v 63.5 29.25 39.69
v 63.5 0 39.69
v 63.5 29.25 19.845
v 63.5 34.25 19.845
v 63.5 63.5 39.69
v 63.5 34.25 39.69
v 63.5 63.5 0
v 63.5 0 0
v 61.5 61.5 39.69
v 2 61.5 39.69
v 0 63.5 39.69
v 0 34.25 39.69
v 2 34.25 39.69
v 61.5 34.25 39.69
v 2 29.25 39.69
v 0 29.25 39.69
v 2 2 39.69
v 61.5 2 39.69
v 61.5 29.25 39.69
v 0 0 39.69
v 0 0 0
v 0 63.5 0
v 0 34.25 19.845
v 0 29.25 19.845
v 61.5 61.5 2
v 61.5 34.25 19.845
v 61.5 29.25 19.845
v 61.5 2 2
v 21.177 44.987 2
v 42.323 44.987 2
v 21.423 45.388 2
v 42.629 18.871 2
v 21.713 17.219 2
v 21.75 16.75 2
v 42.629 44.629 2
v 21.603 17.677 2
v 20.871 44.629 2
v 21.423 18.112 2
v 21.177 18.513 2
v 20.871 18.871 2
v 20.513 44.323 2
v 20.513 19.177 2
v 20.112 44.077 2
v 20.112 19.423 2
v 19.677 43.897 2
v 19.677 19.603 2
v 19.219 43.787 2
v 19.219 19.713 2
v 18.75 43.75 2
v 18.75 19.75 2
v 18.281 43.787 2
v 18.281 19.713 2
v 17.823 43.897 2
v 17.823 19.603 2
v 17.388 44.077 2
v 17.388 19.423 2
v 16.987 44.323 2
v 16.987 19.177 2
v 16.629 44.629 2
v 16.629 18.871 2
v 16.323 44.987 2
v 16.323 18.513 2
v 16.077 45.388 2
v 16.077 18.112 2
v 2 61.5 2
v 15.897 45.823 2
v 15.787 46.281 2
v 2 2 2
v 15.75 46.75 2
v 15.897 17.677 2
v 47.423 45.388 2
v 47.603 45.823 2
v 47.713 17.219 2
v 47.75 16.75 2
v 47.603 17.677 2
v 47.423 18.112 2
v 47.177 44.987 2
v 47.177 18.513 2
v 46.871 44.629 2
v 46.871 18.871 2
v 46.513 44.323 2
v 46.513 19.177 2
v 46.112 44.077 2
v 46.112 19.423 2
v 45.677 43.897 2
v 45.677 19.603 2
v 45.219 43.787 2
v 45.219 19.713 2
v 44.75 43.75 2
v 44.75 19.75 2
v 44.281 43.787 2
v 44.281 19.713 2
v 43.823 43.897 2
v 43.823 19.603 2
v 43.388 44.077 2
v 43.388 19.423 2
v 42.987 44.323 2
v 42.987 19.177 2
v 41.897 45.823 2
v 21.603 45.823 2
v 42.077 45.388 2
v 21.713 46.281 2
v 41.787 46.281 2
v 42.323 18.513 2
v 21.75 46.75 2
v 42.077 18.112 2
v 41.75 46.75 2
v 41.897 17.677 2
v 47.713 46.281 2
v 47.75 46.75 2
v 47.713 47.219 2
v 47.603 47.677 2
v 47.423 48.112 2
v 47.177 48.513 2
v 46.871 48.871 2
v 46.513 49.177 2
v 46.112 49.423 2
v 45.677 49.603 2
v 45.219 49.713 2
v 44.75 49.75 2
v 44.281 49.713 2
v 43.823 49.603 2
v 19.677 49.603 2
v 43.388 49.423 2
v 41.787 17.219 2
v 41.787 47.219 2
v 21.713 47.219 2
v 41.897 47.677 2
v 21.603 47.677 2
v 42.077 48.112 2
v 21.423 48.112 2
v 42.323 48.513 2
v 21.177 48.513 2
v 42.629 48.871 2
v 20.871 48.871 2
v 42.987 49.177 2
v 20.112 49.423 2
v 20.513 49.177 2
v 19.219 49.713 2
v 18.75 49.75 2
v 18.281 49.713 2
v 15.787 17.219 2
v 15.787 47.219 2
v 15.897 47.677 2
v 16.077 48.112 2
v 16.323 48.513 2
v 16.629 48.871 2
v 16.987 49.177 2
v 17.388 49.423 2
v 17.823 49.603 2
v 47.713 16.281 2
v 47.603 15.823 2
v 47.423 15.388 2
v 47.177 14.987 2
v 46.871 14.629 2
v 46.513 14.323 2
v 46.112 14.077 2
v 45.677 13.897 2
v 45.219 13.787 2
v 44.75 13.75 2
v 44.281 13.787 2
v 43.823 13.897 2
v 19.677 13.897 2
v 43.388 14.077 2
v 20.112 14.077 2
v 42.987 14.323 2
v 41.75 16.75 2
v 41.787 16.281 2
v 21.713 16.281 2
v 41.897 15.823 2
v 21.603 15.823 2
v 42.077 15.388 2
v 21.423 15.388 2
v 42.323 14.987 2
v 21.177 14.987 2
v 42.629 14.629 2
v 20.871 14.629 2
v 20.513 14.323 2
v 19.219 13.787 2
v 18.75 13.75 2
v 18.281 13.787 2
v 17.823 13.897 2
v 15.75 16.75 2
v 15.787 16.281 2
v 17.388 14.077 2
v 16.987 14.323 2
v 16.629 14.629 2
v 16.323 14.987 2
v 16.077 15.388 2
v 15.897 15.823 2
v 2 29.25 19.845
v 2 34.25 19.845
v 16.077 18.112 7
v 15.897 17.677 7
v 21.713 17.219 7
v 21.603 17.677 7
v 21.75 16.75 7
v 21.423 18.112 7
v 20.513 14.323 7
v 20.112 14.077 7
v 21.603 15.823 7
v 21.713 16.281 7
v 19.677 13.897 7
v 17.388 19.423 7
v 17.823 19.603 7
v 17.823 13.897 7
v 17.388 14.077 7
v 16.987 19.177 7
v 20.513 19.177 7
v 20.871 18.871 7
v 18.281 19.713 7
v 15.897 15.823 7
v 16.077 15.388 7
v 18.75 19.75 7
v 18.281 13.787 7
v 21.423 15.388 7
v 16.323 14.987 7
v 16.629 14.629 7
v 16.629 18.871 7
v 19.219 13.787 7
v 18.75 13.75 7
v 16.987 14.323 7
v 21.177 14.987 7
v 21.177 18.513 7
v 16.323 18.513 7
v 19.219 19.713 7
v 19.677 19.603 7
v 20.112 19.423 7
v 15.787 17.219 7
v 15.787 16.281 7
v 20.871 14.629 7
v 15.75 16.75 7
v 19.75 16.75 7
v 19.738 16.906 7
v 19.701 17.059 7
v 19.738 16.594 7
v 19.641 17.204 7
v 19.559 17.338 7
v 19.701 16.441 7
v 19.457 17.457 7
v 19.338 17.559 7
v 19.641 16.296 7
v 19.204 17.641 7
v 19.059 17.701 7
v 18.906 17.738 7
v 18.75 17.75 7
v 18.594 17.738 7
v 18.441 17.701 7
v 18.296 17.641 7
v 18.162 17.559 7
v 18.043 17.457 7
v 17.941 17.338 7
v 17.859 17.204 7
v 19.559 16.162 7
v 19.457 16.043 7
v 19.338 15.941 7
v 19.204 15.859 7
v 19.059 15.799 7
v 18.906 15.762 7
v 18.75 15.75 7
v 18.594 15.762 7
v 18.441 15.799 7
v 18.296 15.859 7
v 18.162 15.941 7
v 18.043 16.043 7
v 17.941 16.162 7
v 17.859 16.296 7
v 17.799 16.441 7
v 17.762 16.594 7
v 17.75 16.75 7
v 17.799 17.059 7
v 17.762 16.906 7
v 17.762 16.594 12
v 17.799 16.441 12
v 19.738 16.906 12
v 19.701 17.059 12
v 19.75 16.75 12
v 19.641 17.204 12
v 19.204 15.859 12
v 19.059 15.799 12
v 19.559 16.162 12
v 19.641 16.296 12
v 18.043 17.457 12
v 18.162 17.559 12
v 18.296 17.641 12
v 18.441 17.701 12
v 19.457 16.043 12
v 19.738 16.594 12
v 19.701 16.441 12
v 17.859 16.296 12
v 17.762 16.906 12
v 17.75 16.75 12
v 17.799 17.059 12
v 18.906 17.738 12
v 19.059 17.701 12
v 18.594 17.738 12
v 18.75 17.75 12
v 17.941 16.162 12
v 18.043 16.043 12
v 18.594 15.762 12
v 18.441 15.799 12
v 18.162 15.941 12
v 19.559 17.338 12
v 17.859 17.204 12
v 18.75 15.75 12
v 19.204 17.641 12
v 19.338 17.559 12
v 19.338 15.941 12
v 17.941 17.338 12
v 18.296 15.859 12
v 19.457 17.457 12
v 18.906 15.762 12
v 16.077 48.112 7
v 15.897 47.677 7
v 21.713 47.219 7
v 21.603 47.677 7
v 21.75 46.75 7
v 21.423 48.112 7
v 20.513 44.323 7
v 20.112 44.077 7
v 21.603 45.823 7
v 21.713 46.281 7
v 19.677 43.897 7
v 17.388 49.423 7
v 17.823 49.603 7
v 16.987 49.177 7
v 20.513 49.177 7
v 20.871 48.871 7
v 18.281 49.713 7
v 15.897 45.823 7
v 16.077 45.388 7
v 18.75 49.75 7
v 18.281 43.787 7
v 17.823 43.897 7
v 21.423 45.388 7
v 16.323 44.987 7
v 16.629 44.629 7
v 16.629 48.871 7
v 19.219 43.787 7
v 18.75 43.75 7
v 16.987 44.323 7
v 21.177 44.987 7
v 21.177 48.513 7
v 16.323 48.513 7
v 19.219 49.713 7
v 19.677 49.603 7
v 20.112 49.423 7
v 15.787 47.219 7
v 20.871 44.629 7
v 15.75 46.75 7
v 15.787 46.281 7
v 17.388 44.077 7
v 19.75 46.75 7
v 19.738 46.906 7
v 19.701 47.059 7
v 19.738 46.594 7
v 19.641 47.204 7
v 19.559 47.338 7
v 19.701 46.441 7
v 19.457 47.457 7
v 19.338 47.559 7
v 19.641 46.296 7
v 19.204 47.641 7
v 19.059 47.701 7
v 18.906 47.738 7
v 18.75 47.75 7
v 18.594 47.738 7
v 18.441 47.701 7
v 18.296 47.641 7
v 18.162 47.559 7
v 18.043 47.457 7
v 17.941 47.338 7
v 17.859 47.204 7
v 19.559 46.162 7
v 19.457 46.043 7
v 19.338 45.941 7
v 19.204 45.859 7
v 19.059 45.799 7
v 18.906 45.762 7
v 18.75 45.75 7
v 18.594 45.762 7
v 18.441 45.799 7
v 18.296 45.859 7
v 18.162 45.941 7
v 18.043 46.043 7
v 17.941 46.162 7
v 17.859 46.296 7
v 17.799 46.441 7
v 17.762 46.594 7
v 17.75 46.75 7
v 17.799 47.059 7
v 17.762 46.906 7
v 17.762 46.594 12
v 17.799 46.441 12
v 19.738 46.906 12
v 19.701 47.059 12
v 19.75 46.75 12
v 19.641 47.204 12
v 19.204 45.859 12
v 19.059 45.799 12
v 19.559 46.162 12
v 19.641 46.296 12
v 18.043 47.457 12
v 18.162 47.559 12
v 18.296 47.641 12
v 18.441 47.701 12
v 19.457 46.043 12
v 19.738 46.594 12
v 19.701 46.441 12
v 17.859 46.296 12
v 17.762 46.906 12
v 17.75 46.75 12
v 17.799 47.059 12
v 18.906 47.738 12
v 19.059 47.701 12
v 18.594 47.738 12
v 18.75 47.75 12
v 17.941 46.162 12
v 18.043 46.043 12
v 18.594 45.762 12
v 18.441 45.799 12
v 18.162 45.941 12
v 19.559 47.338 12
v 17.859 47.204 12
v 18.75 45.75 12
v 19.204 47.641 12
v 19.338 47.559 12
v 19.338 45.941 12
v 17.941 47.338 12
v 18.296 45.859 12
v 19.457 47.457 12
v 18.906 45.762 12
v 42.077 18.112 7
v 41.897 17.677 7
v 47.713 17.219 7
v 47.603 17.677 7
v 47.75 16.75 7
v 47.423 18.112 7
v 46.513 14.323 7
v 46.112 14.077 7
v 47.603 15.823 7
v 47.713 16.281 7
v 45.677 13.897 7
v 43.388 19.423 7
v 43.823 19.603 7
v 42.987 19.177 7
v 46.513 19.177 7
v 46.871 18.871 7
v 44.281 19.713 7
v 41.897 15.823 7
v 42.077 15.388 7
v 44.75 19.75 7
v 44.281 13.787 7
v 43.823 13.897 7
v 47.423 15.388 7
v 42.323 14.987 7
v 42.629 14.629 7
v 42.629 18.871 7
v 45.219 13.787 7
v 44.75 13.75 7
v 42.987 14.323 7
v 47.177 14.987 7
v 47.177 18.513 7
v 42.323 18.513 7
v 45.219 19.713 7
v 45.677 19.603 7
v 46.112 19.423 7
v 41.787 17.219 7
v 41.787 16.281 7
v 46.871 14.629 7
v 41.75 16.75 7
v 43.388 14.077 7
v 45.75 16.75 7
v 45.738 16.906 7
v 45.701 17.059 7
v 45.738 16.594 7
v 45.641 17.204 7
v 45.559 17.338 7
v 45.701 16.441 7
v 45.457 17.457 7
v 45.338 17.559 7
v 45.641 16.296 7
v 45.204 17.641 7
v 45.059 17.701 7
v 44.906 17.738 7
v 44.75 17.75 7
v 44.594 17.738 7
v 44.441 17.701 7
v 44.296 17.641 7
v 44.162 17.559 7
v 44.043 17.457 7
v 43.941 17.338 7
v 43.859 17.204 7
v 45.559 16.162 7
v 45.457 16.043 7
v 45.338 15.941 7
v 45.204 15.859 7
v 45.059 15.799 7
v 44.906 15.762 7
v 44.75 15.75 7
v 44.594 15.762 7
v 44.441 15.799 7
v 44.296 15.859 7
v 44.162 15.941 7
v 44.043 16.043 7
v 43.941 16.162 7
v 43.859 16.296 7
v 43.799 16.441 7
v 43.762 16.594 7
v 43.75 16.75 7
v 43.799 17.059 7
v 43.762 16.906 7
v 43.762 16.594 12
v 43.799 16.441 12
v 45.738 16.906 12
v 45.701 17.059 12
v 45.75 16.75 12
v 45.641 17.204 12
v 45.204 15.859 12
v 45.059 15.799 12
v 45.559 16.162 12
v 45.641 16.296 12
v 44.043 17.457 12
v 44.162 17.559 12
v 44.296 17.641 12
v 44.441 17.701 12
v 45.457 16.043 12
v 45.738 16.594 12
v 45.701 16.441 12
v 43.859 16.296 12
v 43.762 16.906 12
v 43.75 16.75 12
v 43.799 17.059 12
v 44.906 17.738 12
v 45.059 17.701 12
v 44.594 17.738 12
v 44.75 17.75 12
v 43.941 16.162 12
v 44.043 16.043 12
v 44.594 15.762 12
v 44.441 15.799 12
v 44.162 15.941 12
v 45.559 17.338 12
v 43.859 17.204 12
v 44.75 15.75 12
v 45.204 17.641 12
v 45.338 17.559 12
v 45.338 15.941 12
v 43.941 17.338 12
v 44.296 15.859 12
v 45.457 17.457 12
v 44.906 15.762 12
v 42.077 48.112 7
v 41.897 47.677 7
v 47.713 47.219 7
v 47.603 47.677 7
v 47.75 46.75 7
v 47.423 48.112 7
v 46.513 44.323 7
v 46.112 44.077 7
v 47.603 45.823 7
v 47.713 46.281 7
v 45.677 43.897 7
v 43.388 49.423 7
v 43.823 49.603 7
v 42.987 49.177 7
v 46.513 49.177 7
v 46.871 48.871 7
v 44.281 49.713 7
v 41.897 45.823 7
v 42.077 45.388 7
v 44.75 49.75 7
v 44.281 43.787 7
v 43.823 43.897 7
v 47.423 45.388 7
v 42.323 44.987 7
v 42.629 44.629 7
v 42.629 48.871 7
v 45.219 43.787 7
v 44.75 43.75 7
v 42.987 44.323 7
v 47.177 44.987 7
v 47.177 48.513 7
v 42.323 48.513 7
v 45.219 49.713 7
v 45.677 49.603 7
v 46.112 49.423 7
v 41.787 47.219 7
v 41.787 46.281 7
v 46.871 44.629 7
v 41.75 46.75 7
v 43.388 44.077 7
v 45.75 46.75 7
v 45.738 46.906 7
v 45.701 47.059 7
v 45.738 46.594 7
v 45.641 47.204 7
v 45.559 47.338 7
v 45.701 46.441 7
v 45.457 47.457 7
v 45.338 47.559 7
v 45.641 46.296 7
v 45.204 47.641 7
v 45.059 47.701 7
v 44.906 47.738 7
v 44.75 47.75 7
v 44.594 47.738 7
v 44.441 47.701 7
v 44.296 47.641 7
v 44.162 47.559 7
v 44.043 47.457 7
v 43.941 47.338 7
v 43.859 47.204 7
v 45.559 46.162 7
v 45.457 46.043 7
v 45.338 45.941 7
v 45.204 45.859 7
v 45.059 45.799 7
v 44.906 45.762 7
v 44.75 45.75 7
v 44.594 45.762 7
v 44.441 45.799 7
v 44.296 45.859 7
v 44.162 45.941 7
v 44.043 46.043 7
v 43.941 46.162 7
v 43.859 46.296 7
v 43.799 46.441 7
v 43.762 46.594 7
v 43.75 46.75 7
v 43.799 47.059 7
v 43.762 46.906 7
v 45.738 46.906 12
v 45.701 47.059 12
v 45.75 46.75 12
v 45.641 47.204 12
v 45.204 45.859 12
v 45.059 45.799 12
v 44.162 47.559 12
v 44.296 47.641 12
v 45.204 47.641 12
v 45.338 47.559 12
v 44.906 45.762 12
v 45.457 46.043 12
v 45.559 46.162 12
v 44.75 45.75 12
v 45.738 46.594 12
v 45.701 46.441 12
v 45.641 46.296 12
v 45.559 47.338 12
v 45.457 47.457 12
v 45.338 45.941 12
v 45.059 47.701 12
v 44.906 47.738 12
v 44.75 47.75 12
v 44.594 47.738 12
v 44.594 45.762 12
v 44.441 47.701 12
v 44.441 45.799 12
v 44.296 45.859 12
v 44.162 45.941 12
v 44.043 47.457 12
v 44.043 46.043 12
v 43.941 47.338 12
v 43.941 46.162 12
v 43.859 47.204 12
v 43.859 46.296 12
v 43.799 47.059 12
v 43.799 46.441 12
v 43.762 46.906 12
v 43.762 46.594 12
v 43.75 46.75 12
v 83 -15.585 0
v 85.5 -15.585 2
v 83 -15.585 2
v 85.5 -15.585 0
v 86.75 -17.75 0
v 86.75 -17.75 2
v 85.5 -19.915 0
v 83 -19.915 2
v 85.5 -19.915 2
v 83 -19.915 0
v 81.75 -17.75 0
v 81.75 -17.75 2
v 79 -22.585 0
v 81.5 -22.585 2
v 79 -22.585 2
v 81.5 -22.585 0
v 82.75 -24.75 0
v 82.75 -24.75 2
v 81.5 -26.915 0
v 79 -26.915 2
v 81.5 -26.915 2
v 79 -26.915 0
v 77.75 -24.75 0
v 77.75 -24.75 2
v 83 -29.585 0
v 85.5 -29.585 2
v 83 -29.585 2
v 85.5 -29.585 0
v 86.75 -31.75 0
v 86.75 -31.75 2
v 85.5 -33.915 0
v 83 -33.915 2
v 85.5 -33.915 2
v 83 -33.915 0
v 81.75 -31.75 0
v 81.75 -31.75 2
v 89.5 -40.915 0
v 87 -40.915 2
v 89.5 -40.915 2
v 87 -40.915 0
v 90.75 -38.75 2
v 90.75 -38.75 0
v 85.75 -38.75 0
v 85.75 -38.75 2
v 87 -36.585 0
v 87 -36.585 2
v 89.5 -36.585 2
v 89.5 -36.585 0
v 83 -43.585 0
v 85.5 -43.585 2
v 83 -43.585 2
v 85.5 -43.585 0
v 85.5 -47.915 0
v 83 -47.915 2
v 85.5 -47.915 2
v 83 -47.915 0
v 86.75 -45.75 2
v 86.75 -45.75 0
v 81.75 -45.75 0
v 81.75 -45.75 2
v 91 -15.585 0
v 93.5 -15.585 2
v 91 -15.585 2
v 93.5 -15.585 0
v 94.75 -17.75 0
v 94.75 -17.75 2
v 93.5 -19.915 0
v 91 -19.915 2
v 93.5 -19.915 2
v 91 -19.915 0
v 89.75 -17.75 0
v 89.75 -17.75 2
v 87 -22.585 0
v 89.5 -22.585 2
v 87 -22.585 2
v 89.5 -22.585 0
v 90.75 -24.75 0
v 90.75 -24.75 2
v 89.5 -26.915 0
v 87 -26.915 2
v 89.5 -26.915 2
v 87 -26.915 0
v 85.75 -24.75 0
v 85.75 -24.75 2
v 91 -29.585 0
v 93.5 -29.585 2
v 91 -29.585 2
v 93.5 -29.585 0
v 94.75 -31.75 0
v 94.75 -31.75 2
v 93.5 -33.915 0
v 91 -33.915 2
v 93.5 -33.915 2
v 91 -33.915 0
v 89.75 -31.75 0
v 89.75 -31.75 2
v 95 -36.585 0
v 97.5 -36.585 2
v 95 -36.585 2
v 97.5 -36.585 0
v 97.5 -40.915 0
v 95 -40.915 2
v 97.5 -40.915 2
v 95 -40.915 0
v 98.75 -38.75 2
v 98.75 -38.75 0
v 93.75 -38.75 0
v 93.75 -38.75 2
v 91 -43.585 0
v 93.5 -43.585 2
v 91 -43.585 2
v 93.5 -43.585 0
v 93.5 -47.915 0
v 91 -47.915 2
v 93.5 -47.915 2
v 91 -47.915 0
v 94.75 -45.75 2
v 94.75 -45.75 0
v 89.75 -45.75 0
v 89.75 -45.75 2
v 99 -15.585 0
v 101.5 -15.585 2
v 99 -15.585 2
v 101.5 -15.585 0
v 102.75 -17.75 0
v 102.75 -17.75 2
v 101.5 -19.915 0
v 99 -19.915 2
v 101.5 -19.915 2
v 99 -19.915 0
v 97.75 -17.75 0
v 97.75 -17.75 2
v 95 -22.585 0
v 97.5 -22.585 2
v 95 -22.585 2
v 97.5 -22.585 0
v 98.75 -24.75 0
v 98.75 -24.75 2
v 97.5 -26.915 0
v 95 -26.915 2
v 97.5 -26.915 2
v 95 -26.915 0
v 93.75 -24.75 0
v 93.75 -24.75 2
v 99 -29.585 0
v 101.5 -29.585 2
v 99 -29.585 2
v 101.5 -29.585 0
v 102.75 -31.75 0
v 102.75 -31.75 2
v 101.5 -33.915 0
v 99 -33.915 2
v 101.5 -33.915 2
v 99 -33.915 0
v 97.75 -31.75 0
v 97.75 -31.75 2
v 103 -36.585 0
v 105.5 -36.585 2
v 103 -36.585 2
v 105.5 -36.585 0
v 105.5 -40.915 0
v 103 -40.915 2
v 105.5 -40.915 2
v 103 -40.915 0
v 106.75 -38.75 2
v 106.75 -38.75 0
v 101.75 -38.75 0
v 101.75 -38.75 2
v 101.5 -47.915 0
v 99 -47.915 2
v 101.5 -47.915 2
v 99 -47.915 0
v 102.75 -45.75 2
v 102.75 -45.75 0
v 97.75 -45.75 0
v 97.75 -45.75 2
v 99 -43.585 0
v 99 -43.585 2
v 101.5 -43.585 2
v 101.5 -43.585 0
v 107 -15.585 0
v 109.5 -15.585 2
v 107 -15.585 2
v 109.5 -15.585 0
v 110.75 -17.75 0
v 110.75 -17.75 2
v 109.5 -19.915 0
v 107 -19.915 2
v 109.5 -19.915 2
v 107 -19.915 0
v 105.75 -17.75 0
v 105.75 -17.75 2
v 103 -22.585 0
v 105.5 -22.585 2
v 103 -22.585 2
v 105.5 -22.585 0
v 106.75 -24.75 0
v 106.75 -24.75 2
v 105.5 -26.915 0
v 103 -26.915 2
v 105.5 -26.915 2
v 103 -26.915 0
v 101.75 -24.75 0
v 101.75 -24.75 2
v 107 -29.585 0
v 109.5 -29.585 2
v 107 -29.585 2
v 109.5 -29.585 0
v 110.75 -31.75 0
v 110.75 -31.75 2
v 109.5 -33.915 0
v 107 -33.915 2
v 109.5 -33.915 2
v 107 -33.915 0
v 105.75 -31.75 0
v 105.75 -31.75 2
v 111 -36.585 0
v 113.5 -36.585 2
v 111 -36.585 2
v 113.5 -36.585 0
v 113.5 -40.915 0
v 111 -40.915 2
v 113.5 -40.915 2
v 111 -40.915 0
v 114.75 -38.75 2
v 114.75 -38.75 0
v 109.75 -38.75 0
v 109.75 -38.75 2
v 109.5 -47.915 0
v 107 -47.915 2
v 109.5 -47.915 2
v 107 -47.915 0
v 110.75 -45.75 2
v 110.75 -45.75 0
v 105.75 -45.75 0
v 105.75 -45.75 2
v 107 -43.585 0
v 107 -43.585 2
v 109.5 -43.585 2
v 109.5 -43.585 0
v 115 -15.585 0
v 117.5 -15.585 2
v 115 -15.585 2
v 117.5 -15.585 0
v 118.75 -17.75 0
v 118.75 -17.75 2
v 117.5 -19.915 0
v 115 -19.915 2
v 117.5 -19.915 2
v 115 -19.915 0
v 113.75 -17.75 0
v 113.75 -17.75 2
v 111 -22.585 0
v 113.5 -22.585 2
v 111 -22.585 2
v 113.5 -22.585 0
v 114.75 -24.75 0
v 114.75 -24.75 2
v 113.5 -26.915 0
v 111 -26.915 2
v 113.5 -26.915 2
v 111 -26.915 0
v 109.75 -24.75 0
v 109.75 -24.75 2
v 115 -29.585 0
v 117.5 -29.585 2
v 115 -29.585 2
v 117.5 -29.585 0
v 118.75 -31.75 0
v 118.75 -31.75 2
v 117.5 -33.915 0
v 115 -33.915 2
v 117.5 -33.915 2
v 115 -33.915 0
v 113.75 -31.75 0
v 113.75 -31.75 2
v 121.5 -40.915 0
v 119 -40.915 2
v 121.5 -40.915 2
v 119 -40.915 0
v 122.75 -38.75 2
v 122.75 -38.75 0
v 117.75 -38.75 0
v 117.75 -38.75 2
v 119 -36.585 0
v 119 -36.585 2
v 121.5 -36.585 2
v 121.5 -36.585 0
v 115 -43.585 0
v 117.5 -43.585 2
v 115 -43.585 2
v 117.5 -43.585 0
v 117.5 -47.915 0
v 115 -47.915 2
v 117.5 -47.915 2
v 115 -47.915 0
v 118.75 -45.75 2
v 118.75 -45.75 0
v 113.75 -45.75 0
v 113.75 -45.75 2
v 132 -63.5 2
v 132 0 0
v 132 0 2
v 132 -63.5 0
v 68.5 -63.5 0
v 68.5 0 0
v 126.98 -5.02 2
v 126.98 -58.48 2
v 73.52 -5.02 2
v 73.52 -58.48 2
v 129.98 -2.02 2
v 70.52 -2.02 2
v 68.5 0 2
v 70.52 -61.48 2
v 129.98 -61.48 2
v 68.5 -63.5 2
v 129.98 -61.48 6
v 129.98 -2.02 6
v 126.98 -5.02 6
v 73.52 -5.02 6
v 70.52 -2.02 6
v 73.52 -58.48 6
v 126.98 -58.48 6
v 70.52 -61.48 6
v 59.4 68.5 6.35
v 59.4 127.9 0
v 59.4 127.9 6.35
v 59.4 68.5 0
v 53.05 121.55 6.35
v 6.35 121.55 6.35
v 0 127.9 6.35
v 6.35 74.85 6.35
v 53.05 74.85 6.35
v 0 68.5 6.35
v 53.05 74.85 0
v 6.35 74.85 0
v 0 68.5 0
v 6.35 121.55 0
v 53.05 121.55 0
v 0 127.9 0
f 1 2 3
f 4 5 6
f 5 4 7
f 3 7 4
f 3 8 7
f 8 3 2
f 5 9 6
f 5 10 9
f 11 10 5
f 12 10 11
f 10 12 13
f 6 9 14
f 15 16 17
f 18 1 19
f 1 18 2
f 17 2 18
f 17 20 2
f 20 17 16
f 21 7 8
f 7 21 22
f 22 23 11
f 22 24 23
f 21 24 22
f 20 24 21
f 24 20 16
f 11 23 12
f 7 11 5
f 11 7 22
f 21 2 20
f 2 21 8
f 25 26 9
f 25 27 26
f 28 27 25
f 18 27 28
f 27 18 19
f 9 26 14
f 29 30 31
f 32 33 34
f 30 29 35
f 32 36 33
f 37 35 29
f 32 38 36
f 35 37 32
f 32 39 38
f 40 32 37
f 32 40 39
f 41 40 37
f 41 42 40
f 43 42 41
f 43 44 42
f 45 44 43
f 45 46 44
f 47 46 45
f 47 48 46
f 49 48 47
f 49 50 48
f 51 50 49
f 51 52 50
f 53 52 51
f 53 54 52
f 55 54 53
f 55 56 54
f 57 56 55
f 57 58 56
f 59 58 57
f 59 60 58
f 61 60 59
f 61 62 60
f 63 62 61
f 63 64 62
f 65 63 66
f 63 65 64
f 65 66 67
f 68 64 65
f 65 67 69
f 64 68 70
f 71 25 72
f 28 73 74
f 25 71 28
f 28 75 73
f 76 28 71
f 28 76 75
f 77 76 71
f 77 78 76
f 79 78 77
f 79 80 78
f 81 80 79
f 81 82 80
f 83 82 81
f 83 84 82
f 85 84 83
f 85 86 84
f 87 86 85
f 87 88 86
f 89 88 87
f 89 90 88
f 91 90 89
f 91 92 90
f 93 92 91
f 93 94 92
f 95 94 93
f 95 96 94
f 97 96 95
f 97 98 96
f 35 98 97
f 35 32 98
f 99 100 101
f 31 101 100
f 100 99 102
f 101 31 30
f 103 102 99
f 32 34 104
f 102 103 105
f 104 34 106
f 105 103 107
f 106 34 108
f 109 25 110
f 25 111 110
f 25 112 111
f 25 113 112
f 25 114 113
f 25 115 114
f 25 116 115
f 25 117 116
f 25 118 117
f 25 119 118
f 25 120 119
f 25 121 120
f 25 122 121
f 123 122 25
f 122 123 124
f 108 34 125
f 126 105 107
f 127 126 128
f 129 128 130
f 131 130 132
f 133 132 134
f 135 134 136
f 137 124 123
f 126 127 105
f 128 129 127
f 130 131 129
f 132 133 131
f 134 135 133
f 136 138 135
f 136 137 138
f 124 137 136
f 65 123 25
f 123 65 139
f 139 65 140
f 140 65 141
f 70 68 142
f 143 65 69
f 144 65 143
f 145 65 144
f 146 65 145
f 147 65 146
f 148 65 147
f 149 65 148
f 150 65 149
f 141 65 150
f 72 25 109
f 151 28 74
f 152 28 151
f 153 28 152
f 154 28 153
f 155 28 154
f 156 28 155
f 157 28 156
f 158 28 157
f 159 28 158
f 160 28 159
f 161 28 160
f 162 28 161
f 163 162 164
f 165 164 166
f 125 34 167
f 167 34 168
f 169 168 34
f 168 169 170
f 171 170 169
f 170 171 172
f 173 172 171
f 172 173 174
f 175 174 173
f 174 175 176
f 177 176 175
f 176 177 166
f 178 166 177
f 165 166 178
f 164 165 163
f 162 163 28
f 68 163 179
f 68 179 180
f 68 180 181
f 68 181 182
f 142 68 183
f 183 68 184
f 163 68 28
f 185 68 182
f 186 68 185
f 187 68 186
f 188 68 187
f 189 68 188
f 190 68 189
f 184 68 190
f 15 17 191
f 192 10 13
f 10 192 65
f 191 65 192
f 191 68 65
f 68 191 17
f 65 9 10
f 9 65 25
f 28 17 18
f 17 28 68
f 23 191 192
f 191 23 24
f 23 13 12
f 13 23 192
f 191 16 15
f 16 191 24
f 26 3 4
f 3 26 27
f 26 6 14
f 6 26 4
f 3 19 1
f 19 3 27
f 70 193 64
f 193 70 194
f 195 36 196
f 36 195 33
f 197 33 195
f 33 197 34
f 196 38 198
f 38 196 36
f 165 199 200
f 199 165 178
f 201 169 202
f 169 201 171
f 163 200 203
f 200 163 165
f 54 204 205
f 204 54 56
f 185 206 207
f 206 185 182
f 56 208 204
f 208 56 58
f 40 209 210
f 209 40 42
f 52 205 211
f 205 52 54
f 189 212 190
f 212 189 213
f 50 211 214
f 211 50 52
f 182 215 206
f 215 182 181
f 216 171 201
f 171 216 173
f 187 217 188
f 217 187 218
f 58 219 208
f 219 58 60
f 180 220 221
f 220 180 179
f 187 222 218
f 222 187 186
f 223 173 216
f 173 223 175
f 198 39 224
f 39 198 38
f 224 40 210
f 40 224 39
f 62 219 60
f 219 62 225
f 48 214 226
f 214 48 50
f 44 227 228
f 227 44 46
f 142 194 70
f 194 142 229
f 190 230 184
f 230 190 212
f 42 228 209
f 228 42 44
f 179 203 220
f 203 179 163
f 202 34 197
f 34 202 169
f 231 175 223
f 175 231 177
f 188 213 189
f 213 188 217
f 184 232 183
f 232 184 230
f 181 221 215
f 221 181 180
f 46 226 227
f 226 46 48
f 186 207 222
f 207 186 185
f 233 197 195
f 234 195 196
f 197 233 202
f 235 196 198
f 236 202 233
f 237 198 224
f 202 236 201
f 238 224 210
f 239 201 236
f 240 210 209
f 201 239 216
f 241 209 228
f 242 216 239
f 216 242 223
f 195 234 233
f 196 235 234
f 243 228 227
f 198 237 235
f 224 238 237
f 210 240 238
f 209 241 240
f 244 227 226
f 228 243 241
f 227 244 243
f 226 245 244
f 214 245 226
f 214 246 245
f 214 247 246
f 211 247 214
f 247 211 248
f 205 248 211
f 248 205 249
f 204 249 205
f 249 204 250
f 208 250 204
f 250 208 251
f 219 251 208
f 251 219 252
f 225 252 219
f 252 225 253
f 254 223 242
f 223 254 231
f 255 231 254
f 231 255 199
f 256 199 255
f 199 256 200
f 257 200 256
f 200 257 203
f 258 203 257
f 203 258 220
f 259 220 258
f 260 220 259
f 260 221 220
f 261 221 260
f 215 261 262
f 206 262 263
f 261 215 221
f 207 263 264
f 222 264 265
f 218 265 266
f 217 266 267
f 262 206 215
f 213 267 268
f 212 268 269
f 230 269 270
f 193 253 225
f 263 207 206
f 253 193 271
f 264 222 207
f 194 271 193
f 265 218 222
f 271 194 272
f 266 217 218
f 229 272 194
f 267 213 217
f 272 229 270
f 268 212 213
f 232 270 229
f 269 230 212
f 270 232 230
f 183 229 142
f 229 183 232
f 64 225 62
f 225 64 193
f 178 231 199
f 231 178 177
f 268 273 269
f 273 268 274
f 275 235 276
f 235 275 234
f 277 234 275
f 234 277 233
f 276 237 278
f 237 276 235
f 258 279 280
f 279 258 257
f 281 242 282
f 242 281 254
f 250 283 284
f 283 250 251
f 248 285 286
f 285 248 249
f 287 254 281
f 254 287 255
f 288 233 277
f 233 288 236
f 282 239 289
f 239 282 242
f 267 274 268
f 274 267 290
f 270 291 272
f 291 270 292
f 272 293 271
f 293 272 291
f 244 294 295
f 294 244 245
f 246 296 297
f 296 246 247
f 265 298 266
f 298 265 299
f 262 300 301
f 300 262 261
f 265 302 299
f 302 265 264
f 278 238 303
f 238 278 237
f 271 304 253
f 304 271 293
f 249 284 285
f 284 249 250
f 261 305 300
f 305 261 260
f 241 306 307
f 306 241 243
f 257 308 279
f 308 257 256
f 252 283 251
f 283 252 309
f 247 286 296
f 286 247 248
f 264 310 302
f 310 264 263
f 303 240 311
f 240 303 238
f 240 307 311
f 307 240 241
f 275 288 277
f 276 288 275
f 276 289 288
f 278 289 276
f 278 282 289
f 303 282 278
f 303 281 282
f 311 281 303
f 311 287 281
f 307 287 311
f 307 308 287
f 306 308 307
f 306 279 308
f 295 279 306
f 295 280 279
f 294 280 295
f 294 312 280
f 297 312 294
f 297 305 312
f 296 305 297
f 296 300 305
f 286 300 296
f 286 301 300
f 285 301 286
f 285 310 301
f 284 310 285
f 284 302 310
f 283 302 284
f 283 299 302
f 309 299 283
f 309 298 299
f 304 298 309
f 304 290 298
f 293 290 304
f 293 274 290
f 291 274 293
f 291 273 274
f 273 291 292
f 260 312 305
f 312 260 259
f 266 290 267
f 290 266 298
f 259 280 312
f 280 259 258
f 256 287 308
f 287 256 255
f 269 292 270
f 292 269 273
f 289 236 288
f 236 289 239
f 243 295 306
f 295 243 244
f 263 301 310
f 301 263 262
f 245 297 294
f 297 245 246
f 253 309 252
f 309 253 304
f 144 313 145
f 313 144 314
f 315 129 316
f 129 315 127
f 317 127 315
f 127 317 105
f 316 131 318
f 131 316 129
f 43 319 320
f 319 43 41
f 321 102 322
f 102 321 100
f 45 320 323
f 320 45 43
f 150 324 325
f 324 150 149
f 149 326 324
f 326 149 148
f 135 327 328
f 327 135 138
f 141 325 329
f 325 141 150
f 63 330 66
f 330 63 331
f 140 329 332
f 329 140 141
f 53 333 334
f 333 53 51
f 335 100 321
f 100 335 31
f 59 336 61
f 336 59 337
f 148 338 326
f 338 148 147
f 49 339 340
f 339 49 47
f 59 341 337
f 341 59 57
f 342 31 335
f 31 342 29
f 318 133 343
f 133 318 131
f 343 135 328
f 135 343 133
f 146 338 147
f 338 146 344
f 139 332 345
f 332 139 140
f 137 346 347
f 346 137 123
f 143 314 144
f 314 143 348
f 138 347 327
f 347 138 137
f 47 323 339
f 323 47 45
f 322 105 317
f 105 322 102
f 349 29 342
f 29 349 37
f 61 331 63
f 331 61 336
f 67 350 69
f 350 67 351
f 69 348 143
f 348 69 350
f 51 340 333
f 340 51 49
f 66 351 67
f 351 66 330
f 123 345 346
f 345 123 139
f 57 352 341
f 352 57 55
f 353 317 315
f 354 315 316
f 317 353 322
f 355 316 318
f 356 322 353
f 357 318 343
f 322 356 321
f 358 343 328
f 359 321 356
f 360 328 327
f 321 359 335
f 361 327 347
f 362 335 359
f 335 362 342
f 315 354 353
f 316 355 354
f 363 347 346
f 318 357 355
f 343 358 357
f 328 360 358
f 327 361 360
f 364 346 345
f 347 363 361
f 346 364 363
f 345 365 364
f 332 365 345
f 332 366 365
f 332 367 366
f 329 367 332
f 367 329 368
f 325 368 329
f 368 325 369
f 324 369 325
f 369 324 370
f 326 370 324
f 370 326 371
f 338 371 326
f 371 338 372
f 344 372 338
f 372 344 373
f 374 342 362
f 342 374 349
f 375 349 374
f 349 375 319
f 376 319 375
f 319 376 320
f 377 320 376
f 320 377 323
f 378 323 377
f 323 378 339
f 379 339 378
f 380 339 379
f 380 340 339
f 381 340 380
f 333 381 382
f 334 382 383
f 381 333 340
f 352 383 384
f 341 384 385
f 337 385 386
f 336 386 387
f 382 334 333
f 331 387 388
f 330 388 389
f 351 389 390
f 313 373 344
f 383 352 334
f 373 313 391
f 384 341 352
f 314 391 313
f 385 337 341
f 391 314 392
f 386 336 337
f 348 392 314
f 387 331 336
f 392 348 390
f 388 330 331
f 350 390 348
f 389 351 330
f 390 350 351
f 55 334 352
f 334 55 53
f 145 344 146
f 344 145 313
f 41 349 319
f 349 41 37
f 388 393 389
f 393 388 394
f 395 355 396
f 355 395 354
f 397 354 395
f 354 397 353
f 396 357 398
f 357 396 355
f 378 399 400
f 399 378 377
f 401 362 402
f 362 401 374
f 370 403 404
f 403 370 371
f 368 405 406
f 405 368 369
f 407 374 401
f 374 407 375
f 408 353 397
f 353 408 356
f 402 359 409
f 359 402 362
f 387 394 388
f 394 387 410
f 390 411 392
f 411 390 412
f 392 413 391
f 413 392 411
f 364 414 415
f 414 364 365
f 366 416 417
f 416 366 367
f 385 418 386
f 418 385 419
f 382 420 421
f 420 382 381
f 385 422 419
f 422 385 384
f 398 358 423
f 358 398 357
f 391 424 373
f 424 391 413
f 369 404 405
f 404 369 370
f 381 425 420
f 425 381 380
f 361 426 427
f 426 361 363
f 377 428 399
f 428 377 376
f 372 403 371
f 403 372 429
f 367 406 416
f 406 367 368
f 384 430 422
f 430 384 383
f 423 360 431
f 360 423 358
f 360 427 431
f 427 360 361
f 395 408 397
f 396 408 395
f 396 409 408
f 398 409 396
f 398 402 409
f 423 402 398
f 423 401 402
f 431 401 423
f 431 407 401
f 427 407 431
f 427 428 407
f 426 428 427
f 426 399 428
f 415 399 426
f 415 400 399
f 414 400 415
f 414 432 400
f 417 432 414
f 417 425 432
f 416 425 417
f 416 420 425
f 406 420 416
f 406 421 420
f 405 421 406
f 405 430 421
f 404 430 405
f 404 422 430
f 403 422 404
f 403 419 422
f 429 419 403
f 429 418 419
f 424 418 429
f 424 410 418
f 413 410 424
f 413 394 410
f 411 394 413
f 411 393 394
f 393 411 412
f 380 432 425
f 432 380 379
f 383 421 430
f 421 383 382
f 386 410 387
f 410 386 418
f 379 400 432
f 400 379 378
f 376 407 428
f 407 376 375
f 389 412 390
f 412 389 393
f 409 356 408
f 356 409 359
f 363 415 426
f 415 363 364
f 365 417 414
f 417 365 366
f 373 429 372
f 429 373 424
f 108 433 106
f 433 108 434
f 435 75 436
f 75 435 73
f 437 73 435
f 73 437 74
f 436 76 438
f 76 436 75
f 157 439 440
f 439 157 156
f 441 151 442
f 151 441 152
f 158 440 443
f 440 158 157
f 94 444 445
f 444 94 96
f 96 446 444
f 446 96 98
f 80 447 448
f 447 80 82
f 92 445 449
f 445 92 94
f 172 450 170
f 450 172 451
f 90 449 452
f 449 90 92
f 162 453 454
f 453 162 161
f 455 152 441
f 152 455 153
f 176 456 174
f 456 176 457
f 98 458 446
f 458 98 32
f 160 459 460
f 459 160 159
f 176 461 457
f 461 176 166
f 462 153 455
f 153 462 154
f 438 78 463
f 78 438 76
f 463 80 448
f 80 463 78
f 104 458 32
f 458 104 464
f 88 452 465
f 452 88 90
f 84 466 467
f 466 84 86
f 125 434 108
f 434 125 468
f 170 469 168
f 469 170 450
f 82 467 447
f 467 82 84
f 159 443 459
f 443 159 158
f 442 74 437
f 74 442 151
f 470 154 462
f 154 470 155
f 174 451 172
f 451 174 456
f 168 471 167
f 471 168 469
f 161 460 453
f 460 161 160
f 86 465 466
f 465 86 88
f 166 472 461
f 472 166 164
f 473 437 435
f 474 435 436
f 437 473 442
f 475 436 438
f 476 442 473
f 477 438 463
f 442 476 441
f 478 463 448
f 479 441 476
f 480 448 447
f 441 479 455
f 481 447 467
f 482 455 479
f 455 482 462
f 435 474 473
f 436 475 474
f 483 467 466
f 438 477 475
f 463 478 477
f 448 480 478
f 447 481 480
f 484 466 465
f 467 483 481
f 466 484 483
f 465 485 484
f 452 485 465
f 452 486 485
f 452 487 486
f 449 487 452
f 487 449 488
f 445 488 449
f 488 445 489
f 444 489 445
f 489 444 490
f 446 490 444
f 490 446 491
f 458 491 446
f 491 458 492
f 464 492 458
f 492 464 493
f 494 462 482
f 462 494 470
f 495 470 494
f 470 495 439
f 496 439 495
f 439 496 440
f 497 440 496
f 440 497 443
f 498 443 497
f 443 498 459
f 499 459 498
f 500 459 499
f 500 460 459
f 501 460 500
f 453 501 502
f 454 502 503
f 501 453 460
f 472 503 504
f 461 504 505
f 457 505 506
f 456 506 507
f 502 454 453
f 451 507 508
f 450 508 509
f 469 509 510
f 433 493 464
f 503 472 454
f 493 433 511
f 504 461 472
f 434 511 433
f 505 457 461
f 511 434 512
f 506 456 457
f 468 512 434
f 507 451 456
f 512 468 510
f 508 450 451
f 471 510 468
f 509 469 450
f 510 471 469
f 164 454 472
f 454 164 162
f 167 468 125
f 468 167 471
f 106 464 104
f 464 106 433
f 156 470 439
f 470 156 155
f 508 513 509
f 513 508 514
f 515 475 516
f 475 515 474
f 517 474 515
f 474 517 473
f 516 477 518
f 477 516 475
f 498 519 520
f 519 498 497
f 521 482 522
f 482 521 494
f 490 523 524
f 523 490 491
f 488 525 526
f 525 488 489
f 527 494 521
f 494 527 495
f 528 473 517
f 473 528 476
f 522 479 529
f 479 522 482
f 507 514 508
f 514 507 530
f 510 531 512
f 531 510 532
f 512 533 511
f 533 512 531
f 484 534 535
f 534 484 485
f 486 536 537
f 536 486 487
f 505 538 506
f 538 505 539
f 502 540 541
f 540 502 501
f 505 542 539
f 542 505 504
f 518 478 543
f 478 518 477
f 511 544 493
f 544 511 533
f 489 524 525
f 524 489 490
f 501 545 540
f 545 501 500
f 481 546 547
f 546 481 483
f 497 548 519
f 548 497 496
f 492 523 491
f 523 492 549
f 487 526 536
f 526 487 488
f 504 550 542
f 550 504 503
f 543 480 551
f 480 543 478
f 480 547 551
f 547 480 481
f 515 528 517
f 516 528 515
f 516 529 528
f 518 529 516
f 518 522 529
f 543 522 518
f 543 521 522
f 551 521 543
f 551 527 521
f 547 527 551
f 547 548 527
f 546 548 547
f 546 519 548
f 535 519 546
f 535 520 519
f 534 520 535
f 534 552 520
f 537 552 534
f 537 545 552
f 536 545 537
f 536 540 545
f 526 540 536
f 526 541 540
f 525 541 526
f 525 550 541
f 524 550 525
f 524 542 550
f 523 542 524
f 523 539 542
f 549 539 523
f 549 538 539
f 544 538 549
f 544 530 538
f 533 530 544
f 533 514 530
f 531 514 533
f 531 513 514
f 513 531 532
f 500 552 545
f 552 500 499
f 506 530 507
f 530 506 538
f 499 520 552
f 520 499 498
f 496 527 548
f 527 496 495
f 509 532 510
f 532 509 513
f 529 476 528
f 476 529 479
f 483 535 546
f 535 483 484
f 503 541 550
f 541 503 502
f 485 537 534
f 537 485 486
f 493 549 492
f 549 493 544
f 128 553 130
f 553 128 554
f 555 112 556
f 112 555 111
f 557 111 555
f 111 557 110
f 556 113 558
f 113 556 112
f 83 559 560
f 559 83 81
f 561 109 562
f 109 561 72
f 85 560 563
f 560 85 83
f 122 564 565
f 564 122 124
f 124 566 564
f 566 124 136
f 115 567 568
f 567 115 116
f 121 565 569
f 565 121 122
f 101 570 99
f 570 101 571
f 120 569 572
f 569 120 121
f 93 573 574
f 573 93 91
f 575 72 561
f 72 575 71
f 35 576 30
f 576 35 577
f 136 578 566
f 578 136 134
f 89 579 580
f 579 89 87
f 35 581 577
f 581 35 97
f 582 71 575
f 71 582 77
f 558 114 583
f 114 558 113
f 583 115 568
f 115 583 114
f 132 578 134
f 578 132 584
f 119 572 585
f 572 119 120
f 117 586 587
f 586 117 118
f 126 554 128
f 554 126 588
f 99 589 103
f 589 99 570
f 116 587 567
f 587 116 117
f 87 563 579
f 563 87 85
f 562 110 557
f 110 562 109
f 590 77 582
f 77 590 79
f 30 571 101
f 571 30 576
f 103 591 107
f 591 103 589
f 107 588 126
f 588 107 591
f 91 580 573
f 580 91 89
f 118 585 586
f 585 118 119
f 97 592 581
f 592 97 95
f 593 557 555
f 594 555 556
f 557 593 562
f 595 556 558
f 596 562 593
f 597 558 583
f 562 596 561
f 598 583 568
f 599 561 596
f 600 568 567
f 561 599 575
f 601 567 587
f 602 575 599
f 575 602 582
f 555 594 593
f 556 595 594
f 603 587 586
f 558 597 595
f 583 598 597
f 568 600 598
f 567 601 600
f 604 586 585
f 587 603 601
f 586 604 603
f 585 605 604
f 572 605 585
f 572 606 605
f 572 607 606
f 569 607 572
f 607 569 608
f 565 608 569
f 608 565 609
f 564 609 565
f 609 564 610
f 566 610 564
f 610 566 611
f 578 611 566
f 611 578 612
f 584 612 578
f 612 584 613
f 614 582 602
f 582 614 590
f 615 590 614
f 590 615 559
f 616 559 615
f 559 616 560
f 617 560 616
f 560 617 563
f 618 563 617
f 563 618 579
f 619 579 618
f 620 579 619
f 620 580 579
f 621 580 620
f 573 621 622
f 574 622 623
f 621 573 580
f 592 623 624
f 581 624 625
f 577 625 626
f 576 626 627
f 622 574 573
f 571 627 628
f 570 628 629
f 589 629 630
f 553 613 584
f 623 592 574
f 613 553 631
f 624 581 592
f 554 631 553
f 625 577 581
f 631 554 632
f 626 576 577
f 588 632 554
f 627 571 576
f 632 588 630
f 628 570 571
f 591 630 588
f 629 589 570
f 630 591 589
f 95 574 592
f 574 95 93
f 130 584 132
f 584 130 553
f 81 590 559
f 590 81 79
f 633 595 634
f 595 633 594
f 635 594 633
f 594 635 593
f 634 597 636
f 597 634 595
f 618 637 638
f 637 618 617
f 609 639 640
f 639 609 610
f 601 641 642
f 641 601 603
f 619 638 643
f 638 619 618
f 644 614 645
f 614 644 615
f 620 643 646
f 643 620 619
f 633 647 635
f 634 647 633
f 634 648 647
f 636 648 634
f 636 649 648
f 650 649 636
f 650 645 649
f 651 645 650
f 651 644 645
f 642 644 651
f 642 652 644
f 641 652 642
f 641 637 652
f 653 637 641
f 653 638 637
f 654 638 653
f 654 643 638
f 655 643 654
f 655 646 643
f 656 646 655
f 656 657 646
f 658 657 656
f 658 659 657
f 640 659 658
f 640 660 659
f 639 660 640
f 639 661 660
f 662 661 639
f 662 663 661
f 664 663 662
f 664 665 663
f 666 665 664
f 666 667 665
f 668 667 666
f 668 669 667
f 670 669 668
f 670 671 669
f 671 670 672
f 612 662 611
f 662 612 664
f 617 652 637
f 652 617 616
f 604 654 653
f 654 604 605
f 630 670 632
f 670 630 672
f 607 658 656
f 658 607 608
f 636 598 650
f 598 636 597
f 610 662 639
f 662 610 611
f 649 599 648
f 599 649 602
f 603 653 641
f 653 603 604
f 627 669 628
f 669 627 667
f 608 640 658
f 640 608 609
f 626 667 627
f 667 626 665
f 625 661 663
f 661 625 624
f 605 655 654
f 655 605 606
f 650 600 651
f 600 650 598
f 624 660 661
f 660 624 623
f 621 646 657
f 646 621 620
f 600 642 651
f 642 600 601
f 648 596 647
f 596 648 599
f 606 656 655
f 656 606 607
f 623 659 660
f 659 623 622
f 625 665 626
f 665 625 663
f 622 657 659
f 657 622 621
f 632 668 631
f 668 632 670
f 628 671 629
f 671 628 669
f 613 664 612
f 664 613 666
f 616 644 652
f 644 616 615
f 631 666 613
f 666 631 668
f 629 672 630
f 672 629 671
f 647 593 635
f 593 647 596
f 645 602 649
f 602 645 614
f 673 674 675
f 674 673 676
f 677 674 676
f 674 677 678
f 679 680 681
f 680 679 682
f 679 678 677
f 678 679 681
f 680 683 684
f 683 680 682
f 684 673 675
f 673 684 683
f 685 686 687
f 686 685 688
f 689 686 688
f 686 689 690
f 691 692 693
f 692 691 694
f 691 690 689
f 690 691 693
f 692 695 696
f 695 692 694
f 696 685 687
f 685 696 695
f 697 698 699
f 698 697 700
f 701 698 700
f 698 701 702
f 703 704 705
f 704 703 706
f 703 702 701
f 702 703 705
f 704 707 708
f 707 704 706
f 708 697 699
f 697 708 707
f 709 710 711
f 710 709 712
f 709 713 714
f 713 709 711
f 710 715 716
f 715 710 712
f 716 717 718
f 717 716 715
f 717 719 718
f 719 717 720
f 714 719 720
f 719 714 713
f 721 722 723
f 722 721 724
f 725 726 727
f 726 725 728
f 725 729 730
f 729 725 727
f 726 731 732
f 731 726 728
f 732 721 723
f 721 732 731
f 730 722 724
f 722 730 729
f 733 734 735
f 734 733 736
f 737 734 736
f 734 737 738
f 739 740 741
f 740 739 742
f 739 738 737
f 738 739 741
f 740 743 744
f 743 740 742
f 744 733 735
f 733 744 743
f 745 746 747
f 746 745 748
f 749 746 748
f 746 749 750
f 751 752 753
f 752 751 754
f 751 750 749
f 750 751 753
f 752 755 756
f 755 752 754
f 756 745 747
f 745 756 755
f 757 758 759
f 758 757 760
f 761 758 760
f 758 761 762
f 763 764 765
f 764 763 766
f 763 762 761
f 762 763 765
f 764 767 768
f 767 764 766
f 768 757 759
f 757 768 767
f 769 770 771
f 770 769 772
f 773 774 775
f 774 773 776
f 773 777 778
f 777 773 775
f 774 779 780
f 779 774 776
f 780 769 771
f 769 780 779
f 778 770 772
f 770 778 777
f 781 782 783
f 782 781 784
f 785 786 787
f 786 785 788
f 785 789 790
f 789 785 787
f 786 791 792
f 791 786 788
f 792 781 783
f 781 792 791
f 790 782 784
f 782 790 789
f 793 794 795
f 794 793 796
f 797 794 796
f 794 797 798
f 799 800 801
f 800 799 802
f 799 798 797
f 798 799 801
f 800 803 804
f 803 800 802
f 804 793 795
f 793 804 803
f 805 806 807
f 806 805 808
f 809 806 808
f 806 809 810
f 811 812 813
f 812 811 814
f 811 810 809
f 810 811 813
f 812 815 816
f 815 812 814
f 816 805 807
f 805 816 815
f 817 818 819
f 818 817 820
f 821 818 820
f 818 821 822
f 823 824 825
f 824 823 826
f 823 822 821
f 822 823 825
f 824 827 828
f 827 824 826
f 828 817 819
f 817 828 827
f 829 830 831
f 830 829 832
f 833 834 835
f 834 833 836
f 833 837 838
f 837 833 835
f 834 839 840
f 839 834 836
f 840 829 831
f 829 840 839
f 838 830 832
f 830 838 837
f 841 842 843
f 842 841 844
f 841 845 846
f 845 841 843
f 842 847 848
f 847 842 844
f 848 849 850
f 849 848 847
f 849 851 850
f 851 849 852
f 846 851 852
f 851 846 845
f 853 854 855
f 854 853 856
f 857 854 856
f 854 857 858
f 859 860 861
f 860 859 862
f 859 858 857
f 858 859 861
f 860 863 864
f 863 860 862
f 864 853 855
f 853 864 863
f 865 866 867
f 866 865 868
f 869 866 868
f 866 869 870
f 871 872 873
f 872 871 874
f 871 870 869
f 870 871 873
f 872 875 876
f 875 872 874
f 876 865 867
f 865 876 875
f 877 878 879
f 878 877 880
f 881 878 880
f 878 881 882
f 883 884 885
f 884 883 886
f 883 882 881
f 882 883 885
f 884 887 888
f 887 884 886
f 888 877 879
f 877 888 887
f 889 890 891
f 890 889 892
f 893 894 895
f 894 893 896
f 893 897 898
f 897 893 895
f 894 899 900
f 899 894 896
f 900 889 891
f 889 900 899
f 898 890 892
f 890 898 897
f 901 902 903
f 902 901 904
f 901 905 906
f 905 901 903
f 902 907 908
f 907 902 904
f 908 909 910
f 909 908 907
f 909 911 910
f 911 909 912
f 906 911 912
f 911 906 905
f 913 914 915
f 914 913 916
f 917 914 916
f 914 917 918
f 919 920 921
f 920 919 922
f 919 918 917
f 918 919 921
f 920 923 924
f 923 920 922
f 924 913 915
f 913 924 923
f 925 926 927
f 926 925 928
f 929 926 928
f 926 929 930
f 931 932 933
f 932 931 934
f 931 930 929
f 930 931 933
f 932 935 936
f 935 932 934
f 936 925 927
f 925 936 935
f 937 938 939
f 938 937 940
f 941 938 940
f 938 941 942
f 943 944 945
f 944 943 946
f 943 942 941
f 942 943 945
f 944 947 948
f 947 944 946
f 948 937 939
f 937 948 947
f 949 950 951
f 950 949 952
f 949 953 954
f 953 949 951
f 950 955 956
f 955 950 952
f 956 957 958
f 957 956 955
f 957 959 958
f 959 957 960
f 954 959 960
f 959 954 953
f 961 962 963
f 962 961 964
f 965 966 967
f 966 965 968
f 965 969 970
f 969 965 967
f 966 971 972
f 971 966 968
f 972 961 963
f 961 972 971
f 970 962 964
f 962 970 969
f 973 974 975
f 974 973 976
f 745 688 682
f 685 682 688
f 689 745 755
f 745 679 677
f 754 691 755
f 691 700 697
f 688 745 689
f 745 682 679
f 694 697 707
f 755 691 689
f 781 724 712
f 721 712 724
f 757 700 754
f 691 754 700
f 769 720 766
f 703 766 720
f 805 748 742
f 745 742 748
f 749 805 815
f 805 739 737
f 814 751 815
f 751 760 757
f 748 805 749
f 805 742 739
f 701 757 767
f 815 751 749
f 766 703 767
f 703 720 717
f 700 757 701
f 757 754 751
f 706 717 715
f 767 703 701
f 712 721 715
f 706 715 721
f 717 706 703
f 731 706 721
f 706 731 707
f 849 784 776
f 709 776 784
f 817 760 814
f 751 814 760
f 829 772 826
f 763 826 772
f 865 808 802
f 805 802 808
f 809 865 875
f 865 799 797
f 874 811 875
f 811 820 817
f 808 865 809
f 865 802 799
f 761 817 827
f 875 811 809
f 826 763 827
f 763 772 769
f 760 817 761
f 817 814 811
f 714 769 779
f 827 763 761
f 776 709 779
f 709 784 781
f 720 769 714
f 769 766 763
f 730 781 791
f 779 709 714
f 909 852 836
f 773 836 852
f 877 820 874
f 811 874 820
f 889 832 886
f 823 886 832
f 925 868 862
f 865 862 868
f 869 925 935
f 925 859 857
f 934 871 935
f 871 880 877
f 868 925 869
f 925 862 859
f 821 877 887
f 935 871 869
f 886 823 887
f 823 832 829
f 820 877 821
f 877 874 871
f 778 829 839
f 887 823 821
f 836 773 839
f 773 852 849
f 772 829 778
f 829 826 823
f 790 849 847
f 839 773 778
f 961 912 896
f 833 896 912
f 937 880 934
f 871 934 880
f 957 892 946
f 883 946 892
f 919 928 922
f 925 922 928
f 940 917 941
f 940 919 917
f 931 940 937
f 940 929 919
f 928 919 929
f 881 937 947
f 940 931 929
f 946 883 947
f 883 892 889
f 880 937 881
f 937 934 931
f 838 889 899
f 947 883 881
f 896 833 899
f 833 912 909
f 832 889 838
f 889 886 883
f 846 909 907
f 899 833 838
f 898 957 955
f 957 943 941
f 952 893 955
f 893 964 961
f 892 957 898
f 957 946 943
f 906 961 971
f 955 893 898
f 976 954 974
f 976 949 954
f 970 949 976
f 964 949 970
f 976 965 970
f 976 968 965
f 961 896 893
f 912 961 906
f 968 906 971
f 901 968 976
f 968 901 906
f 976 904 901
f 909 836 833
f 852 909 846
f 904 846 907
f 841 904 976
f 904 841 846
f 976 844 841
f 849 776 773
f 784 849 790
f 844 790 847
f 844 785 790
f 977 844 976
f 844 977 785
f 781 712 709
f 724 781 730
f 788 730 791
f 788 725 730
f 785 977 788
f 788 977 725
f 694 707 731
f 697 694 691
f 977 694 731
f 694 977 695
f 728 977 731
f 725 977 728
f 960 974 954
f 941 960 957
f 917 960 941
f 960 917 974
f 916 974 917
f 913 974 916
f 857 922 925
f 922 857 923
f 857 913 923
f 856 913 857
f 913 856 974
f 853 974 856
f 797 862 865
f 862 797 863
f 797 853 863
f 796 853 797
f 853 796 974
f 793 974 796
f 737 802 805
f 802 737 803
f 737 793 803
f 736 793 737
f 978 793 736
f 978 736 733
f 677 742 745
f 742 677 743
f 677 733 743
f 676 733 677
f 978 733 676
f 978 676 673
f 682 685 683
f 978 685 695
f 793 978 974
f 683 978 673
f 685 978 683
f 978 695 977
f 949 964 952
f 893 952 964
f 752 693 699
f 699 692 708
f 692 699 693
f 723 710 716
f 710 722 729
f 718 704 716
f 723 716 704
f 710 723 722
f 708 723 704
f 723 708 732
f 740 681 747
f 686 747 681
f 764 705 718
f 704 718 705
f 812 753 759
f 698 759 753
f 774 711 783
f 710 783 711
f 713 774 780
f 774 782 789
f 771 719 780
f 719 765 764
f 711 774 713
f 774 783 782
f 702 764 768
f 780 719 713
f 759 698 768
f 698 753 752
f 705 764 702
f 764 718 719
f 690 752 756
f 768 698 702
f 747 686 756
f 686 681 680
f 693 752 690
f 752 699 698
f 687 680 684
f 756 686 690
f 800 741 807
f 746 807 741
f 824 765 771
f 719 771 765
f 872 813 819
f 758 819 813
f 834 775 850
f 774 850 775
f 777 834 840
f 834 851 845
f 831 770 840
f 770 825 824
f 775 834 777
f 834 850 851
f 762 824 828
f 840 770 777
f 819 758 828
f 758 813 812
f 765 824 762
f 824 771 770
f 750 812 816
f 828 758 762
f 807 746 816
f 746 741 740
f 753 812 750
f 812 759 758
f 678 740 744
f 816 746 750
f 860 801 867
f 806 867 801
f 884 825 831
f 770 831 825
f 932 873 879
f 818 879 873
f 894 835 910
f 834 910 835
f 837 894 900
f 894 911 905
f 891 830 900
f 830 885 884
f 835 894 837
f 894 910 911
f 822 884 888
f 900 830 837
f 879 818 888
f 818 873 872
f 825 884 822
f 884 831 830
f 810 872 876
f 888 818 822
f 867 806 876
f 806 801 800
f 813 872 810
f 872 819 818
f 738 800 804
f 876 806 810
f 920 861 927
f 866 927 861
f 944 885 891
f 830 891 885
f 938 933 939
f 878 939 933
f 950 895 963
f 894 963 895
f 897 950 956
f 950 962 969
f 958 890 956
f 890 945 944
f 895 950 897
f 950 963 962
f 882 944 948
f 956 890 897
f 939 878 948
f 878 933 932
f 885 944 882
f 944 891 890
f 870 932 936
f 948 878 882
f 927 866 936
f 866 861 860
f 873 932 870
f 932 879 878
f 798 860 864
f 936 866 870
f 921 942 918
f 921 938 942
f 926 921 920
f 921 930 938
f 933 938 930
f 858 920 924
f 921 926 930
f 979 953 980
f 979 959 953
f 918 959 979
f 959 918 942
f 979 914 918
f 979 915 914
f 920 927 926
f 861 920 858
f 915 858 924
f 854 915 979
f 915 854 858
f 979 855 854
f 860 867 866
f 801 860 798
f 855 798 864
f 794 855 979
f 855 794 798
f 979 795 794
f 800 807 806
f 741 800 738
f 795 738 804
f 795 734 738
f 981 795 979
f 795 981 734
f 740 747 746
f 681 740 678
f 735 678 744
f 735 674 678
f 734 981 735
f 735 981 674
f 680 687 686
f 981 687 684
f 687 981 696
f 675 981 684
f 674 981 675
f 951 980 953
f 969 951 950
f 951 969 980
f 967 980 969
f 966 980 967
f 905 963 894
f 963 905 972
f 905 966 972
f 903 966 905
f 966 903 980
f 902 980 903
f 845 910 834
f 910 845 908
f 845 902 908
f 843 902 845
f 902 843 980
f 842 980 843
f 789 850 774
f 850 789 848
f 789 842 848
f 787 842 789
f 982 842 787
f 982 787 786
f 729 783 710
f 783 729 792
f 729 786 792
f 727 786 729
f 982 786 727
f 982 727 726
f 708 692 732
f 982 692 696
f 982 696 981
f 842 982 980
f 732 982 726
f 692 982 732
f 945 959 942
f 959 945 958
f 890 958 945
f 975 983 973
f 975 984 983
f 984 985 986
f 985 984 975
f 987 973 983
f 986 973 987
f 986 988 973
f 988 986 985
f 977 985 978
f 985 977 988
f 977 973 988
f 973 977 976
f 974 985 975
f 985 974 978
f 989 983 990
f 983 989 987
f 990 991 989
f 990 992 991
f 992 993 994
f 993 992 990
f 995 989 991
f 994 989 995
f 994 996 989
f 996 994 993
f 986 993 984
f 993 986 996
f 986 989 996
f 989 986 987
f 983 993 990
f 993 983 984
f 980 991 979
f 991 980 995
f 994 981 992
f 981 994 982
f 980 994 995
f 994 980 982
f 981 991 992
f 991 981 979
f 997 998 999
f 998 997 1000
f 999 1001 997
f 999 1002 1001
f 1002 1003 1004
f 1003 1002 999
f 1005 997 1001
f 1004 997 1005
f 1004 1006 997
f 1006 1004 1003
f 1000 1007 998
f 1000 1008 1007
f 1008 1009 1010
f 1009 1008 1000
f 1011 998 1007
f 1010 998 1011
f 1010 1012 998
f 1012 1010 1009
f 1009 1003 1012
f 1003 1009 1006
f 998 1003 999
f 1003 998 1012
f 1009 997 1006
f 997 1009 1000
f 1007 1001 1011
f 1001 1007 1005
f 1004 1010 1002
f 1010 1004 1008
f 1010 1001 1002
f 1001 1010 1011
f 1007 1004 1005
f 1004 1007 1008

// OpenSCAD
// Custom Enclosure for ULN2003 Stepper Motor Driver Board
// Updated: Box height 1 9/16", pin standoffs, and a printable sliding wire retention ring.

$fn = 40; // Circle smoothness

// --- PARAMETERS ---
box_size = 63.5;       // 2.5 inches square
box_height = 39.69;    // 1 9/16 inches overall height
wall_thick = 2.0;      // Outer shell wall thickness

// Board Mounting Dimensions (Calculated from ruler photos: ~26mm x 30mm)
pcb_hole_w = 26.0;     // Center-to-center hole spacing (Width)
pcb_hole_l = 30.0;     // Center-to-center hole spacing (Length)

standoff_h = 5.0;      // Height of main support base
standoff_dia = 6.0;    // Diameter of standoff base pillars
pin_h = 5.0;           // UPDATED: Increased from 3.0 to 5.0 for a taller registration fit
pin_dia = 2.0;         // Diameter of alignment pin (fits standard PCB holes)

// Slits for wires (Halfway down opposite walls)
slit_w = 5.0;          // Width of wire drop slots
slit_depth = box_height / 2; 

// Wire Retention Ring Dimensions
ring_height = 6.35;    // 1/4 inch high
ring_width = 6.35;     // 1/4 inch wall thickness
ring_clearance = 0.05; // UPDATED: Tightened from 0.15 to 0.05 to ensure a tight slide fit inside the box


// --- PRINT BED ARRANGEMENT (Z = 0) ---
// Tightly packed to fit within the 180x180mm footprint of the Bambu Lab A1 Mini

// 1. Main Enclosure Base
translate([0, 0, 0]) {
    main_enclosure_base();
}

// 2. Enclosure Lid (Shifted closer from box_size + 15 down to box_size + 5)
translate([box_size + 5, 0, wall_thick]) {
    rotate([180, 0, 0]) {
        enclosure_lid();
    }
}

// 3. Sliding Wire Retention Ring (Tucked right below the main base with a tight 5mm gap)
translate([0, box_size + 5, 0]) {
    wire_retention_ring();
}


// --- MODULES ---

module main_enclosure_base() {
    difference() {
        // Outer Solid Box
        cube([box_size, box_size, box_height]);
        
        // Inner Hollow Space
        translate([wall_thick, wall_thick, wall_thick])
            cube([box_size - (wall_thick * 2), box_size - (wall_thick * 2), box_height]);
        
        // Wire Slit 1 (Left wall, centered)
        translate([-0.1, box_size / 2 - slit_w / 2, box_height - slit_depth])
            cube([wall_thick + 0.2, slit_w, slit_depth + 0.1]);
            
        // Wire Slit 2 (Right wall, centered)
        translate([box_size - wall_thick - 0.1, box_size / 2 - slit_w / 2, box_height - slit_depth])
            cube([wall_thick + 0.2, slit_w, slit_depth + 0.1]);
    }
    
    // Four Centered PCB Pin Standoffs
    translate([box_size / 2, box_size / 2, wall_thick]) {
        for (x = [-pcb_hole_w / 2, pcb_hole_w / 2]) {
            for (y = [-pcb_hole_l / 2, pcb_hole_l / 2]) {
                translate([x, y, 0]) {
                    // Standoff Support Base
                    cylinder(h = standoff_h, d = standoff_dia);
                    // Alignment Pin on top
                    translate([0, 0, standoff_h])
                        cylinder(h = pin_h, d = pin_dia);
                }
            }
        }
    }
}

module enclosure_lid() {
    lid_lip_height = 4.0; // Deeper friction path for a tight fit
    lid_clearance = 0.02; // UPDATED: Reduced from 0.1 to 0.02 for a tighter snap/friction fit
    lip_thick = 3.0;      // Thicker wall layers on the inner lip profile
    
    // Main Lid Flat Plate
    difference() {
        cube([box_size, box_size, wall_thick]);
        
        // Ventilation Array (Hexagonal patterns centered on the top)
        translate([box_size / 2, box_size / 2, -0.1]) {
            for (xi = [-2:2]) {
                for (yi = [-2:2]) {
                    translate([xi * 8 + (yi % 2 * 4), yi * 7, 0])
                        cylinder(h = wall_thick + 0.2, r = 2.5, $fn = 6);
                }
            }
        }
    }
    
    // Reinforced Inner Alignment Lip 
    difference() {
        translate([wall_thick + lid_clearance, wall_thick + lid_clearance, -lid_lip_height])
            cube([box_size - (wall_thick * 2) - (lid_clearance * 2), box_size - (wall_thick * 2) - (lid_clearance * 2), lid_lip_height]);
        
        // Inner clearance cutout leaving a strong, thick tracking lip perimeter
        translate([wall_thick + lid_clearance + lip_thick, wall_thick + lid_clearance + lip_thick, -lid_lip_height - 0.1])
            cube([box_size - (wall_thick * 2) - (lid_clearance * 2) - (lip_thick * 2), box_size - (wall_thick * 2) - (lid_clearance * 2) - (lip_thick * 2), lid_lip_height + 0.2]);
    }
}

module wire_retention_ring() {
    // Computes the size needed to slide perfectly into the box's inner footprint
    outer_ring_size = box_size - (wall_thick * 2) - (ring_clearance * 2);
    inner_ring_size = outer_ring_size - (ring_width * 2);
    
    difference() {
        // Outer ring solid boundary
        cube([outer_ring_size, outer_ring_size, ring_height]);
        
        // Center cutout to leave a 1/4" boundary profile
        translate([ring_width, ring_width, -0.1])
            cube([inner_ring_size, inner_ring_size, ring_height + 0.2]);
    }
}
